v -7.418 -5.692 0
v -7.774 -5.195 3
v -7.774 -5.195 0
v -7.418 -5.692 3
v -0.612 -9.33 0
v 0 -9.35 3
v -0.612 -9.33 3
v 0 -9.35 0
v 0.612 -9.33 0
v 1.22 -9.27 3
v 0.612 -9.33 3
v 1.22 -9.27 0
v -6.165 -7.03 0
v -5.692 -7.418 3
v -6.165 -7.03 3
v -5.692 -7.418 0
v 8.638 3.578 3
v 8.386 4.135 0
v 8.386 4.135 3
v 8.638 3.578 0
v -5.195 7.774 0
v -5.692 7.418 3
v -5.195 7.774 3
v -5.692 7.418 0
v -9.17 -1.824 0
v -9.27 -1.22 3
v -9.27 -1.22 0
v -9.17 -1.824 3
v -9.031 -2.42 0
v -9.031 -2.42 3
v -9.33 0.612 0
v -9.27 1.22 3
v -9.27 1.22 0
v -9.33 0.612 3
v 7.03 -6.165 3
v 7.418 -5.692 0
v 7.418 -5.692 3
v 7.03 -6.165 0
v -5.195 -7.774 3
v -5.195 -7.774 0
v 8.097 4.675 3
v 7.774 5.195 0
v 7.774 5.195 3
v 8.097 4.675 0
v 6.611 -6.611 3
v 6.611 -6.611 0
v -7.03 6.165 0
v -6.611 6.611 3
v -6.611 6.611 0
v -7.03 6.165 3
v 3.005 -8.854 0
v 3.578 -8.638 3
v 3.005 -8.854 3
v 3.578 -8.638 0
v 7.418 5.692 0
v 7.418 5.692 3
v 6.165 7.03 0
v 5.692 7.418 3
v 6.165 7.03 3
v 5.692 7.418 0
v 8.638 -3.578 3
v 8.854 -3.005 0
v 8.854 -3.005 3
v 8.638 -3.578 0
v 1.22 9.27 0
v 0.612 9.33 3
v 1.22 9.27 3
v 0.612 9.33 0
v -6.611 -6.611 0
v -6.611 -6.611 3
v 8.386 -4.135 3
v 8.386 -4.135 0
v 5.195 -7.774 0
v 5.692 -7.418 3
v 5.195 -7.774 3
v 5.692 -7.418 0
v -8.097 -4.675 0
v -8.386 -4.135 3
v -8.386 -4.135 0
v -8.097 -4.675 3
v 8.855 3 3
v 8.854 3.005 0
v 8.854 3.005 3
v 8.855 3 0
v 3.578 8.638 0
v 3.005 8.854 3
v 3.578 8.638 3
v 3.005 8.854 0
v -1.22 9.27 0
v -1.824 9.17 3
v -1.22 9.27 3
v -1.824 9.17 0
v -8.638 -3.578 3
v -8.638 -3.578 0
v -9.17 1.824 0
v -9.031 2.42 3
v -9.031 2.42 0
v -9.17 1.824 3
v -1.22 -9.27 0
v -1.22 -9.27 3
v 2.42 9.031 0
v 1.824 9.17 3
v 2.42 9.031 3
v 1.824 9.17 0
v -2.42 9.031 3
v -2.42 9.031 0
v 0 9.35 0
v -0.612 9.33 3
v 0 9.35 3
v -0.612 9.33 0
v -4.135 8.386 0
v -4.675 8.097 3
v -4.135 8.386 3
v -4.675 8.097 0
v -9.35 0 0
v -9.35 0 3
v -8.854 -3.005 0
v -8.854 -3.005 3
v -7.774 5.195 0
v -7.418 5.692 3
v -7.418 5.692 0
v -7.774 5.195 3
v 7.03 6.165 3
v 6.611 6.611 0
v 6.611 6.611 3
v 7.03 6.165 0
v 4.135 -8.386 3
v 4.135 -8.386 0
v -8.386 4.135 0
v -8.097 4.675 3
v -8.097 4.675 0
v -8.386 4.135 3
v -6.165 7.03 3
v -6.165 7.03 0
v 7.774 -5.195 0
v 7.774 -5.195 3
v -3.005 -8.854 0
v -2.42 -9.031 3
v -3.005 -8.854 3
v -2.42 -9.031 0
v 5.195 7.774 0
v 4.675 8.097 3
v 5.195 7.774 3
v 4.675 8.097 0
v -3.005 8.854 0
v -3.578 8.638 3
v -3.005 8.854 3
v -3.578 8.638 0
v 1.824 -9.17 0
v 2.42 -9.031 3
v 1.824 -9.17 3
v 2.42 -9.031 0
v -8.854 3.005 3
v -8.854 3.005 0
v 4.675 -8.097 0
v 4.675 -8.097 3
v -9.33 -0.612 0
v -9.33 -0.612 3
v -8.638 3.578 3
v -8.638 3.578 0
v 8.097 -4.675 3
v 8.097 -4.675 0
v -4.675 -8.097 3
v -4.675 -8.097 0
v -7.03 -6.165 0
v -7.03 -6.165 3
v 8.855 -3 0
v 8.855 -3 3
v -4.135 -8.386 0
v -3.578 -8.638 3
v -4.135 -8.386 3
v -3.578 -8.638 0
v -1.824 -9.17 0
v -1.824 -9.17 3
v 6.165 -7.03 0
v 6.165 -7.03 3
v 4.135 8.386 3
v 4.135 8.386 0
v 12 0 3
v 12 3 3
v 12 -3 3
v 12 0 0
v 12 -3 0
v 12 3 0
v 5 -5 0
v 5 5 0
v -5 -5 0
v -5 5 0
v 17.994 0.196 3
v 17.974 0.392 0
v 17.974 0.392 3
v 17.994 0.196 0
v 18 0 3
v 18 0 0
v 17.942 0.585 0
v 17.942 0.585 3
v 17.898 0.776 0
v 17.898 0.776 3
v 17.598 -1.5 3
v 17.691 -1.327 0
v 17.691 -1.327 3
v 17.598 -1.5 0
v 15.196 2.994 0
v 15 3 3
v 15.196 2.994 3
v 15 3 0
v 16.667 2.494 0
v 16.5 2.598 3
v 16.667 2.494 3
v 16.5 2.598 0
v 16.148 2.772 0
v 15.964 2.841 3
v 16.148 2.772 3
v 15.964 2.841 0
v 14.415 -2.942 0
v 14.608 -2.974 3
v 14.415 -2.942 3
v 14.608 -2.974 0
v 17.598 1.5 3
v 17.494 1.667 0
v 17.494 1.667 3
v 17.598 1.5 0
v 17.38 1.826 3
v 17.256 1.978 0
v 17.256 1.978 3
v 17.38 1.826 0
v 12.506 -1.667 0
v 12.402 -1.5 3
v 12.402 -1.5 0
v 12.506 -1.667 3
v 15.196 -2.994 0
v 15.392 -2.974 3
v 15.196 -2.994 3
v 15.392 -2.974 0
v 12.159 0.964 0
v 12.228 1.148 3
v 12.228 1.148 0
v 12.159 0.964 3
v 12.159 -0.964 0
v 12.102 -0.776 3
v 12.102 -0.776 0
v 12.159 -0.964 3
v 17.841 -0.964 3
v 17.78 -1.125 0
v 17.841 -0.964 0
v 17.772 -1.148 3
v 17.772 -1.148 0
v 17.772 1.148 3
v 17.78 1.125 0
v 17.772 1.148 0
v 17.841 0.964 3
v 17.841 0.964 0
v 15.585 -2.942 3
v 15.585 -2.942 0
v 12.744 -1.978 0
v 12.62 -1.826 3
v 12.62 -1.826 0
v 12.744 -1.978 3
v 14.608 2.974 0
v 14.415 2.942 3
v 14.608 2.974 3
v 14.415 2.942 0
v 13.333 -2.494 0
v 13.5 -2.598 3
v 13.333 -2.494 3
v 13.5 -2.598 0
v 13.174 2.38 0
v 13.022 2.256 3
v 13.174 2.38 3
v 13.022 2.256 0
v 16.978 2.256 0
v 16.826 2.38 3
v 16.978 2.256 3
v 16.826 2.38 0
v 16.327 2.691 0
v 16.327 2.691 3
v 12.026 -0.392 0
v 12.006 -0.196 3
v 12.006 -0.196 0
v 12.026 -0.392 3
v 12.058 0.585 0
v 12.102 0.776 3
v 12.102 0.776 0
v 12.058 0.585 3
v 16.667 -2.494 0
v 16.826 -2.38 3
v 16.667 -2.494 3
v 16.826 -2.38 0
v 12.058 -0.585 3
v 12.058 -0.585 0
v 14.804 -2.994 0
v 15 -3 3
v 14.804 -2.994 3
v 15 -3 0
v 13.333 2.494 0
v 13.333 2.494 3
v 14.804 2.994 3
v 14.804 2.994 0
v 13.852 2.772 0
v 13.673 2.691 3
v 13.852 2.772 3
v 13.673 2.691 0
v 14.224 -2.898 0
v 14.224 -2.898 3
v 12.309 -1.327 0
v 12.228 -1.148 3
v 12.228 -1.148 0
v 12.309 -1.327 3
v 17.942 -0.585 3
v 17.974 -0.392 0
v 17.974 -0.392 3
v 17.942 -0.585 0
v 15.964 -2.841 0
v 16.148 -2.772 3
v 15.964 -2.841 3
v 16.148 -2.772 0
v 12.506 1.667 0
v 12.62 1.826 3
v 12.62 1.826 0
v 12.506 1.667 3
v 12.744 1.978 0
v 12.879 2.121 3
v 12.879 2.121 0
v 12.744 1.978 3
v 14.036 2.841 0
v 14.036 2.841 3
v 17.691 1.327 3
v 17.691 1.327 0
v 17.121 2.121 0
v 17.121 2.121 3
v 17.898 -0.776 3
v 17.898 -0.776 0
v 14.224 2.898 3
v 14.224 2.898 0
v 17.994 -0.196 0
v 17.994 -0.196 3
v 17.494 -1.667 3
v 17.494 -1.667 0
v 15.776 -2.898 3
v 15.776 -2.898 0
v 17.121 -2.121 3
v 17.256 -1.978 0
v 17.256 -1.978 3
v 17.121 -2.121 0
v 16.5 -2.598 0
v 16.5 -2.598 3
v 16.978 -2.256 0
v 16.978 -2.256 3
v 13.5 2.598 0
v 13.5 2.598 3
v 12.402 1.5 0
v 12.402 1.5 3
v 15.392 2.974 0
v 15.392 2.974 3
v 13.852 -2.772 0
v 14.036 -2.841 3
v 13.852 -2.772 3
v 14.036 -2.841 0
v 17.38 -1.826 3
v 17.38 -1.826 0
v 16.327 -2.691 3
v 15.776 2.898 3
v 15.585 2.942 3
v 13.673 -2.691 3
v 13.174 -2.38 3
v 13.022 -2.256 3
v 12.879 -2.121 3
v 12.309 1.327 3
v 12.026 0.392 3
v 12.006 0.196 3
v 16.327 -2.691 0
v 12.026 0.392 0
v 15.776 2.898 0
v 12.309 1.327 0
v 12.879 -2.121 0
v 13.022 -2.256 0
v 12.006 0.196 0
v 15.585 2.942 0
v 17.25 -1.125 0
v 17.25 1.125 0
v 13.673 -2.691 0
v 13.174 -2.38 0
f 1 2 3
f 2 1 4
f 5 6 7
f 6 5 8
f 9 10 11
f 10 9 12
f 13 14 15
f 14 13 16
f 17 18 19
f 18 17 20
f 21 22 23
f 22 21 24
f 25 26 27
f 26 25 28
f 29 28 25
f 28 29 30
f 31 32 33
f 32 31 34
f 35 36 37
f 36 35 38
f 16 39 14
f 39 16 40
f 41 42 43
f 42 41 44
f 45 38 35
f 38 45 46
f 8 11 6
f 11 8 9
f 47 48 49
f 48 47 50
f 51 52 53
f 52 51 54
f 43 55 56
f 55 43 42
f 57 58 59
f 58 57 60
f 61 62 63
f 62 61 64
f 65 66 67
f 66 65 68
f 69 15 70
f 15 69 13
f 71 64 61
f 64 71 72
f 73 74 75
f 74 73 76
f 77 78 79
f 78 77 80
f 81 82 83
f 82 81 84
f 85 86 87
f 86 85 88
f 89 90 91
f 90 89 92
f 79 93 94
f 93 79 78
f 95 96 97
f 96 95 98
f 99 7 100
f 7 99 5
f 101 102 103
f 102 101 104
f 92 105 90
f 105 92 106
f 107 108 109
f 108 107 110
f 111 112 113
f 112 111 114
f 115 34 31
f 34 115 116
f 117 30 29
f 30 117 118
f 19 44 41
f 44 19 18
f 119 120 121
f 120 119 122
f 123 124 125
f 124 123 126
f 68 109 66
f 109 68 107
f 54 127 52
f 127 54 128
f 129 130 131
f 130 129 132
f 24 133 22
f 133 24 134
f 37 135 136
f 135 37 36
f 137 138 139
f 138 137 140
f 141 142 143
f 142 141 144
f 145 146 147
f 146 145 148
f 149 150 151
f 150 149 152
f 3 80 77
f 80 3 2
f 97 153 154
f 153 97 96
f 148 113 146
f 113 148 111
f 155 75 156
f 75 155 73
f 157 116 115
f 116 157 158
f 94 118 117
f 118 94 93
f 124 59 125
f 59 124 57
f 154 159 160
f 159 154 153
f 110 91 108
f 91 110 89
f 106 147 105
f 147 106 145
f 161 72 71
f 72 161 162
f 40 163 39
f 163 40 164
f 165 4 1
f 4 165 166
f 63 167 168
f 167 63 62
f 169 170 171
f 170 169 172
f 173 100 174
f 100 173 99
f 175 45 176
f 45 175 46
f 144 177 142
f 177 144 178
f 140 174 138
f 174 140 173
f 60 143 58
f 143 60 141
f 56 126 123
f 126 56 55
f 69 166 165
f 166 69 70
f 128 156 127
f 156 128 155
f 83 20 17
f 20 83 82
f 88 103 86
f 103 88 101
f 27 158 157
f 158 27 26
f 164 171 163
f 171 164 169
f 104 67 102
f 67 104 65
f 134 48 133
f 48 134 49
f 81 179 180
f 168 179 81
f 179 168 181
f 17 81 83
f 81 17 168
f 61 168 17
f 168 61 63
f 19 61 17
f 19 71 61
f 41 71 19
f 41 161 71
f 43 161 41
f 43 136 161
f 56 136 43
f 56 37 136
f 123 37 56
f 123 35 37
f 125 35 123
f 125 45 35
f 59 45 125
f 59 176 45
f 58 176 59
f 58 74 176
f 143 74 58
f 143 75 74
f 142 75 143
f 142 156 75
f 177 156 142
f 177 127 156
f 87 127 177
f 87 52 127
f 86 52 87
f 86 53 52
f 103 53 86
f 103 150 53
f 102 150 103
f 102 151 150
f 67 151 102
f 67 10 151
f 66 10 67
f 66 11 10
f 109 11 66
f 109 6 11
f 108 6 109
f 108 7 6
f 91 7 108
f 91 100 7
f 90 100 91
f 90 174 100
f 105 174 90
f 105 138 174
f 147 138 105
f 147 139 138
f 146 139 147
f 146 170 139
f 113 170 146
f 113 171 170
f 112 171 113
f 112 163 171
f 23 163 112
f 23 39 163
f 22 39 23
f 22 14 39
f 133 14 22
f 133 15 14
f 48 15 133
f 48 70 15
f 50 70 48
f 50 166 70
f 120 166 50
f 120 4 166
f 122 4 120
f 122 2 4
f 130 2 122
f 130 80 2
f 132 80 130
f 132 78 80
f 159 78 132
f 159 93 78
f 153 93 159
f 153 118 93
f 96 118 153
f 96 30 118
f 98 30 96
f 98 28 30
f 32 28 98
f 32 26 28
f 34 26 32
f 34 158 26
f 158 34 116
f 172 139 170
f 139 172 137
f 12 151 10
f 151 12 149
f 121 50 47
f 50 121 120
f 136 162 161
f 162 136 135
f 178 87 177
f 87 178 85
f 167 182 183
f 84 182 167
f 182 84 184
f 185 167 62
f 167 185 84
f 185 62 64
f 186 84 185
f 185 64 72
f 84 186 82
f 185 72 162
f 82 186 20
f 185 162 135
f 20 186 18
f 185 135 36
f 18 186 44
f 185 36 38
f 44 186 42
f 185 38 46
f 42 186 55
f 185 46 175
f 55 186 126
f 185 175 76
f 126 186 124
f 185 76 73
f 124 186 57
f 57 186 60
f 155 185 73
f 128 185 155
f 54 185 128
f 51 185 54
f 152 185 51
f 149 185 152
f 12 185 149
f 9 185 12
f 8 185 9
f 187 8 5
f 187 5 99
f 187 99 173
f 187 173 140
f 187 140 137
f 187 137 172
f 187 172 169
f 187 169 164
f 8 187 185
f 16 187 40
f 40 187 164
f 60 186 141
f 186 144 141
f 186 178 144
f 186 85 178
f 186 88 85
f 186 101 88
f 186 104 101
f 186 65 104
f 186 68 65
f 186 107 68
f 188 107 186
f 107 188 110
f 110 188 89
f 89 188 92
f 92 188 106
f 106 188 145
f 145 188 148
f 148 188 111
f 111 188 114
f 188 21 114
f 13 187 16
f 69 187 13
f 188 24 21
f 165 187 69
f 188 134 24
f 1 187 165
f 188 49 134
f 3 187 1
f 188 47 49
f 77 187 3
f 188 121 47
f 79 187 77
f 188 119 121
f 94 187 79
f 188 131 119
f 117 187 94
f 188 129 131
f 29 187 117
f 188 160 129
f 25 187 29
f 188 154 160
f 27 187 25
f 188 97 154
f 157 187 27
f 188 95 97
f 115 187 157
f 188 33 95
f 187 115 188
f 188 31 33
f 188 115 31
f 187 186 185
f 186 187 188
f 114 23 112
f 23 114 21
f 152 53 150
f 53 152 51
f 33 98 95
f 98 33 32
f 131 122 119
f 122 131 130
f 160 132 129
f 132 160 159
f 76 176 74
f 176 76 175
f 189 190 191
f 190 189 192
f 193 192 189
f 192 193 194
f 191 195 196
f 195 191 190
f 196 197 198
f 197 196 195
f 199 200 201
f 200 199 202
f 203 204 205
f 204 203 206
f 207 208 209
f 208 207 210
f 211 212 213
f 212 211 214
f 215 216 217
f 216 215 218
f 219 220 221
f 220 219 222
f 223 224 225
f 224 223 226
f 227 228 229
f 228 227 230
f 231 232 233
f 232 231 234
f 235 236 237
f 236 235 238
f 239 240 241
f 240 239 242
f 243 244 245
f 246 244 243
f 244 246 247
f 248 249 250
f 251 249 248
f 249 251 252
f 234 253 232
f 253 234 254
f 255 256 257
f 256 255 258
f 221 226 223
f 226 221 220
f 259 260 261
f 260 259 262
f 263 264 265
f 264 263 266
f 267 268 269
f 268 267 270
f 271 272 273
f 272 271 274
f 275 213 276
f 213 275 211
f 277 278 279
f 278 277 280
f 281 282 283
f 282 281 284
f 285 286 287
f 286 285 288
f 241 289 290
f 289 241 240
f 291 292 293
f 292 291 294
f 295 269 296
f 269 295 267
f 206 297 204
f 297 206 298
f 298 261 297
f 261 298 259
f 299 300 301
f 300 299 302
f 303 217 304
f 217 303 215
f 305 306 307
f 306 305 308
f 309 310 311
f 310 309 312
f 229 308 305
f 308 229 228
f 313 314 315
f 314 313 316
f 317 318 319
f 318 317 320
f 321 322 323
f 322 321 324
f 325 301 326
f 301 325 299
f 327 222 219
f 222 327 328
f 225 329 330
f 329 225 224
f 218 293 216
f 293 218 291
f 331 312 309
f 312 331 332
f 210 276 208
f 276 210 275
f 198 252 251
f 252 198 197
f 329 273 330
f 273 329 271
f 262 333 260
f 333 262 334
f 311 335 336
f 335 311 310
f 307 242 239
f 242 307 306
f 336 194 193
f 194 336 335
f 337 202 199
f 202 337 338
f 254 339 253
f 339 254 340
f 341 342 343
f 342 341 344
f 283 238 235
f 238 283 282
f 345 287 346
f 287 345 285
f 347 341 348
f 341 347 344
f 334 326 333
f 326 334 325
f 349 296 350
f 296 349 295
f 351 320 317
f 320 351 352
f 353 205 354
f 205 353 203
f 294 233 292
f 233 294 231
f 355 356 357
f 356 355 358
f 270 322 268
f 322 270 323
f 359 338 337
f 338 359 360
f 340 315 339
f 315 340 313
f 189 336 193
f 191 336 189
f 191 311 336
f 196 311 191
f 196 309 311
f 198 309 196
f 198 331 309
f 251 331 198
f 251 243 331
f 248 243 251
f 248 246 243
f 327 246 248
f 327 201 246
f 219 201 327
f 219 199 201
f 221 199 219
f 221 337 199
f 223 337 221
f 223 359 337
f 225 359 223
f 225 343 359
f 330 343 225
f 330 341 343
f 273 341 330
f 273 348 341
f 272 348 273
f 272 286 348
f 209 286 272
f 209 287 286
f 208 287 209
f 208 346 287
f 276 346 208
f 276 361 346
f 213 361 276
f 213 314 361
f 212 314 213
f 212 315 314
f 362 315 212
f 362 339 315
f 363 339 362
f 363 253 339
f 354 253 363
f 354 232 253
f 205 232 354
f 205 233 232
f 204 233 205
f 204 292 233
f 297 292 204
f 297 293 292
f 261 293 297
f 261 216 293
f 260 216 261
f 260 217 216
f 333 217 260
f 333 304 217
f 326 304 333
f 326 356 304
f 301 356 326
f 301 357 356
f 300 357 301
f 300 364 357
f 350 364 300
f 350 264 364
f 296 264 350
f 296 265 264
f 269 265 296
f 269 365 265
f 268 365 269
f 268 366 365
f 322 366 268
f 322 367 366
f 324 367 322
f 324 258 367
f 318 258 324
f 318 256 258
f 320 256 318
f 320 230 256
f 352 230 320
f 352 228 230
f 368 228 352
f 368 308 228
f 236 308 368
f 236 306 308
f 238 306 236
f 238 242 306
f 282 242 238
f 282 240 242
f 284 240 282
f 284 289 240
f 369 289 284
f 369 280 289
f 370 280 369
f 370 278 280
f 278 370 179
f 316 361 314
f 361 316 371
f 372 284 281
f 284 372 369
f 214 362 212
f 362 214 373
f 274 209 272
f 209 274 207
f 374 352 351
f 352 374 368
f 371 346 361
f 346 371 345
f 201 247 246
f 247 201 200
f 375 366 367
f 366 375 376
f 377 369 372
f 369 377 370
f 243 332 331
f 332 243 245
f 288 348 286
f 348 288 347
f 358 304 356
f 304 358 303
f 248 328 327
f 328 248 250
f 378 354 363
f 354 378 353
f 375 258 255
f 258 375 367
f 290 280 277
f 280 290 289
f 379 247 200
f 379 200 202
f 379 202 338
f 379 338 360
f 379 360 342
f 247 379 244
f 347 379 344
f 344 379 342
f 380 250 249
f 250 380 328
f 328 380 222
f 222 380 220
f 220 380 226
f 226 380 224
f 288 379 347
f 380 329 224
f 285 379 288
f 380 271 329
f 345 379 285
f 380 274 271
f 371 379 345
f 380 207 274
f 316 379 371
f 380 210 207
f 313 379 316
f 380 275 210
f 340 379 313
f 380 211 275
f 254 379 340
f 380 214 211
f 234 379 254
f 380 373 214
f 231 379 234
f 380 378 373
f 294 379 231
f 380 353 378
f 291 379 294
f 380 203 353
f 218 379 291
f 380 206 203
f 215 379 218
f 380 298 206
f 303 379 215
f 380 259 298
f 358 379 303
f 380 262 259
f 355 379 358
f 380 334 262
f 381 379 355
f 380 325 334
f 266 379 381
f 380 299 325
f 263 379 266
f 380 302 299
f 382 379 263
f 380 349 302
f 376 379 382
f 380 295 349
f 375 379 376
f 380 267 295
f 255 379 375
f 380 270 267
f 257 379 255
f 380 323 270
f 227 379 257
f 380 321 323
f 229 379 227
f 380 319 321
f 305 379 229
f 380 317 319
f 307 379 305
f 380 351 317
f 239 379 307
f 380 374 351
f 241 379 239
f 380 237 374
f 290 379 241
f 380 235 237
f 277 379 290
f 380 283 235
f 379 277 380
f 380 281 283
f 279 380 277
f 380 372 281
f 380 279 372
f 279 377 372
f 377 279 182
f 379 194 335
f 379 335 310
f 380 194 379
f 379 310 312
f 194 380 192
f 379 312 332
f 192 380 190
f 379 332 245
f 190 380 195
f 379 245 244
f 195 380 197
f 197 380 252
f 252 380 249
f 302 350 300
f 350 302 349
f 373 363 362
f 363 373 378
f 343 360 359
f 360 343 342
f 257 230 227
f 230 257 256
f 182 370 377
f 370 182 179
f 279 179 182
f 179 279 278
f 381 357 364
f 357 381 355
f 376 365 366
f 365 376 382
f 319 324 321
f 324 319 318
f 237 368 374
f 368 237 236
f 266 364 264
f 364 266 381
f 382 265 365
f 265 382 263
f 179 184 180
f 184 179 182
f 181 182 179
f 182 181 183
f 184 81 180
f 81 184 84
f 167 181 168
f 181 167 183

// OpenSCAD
// Snap-on tubing clip for a 12.7 mm (1/2 inch) lab stand rod
// Print orientation: flat on the bed, extruded along +Z

// ---------------- Parameters ----------------
ring_od      = 18.7;   // rod ring outer diameter
ring_id      = 12.7;   // rod ring inner diameter
ring_w       = 3;      // rod ring wall thickness
ring_open    = 10;     // width of the -X side opening (y = +/-5)

tube_od      = 6;      // tubing ring outer diameter
tube_id      = 4;      // tubing ring inner diameter
tube_w       = 2;      // tubing ring wall thickness
tube_open    = 4.5;    // width of the +X side opening (y = +/-2.25)

bridge_x0    = 8;      // bridge start (x)
bridge_x1    = 12;     // bridge end (x)
bridge_y     = 6;      // bridge width (y)

eps          = 0.5;    // cutter overshoot past faces
$fn          = 96;     // curve resolution

// ---------------- Model ----------------
difference() {
    union() {
        // Rod ring
        cylinder(d = ring_od, h = ring_w);
        // Tubing ring
        translate([15, 0, 0])
            cylinder(d = tube_od, h = ring_w);
        // Solid bridge between the rings
        translate([bridge_x0, -bridge_y / 2, 0])
            cube([bridge_x1 - bridge_x0, bridge_y, ring_w]);
    }

    // Opening in the rod ring (-X side)
    translate([-ring_open / 2, -5, -eps])
        cube([ring_open, 10, eps]);

    // Opening in the tubing ring (+X side)
    translate([15 + tube_open / 2, -tube_open / 4, -eps])
        cube([tube_open, tube_open / 2, eps]);
}
